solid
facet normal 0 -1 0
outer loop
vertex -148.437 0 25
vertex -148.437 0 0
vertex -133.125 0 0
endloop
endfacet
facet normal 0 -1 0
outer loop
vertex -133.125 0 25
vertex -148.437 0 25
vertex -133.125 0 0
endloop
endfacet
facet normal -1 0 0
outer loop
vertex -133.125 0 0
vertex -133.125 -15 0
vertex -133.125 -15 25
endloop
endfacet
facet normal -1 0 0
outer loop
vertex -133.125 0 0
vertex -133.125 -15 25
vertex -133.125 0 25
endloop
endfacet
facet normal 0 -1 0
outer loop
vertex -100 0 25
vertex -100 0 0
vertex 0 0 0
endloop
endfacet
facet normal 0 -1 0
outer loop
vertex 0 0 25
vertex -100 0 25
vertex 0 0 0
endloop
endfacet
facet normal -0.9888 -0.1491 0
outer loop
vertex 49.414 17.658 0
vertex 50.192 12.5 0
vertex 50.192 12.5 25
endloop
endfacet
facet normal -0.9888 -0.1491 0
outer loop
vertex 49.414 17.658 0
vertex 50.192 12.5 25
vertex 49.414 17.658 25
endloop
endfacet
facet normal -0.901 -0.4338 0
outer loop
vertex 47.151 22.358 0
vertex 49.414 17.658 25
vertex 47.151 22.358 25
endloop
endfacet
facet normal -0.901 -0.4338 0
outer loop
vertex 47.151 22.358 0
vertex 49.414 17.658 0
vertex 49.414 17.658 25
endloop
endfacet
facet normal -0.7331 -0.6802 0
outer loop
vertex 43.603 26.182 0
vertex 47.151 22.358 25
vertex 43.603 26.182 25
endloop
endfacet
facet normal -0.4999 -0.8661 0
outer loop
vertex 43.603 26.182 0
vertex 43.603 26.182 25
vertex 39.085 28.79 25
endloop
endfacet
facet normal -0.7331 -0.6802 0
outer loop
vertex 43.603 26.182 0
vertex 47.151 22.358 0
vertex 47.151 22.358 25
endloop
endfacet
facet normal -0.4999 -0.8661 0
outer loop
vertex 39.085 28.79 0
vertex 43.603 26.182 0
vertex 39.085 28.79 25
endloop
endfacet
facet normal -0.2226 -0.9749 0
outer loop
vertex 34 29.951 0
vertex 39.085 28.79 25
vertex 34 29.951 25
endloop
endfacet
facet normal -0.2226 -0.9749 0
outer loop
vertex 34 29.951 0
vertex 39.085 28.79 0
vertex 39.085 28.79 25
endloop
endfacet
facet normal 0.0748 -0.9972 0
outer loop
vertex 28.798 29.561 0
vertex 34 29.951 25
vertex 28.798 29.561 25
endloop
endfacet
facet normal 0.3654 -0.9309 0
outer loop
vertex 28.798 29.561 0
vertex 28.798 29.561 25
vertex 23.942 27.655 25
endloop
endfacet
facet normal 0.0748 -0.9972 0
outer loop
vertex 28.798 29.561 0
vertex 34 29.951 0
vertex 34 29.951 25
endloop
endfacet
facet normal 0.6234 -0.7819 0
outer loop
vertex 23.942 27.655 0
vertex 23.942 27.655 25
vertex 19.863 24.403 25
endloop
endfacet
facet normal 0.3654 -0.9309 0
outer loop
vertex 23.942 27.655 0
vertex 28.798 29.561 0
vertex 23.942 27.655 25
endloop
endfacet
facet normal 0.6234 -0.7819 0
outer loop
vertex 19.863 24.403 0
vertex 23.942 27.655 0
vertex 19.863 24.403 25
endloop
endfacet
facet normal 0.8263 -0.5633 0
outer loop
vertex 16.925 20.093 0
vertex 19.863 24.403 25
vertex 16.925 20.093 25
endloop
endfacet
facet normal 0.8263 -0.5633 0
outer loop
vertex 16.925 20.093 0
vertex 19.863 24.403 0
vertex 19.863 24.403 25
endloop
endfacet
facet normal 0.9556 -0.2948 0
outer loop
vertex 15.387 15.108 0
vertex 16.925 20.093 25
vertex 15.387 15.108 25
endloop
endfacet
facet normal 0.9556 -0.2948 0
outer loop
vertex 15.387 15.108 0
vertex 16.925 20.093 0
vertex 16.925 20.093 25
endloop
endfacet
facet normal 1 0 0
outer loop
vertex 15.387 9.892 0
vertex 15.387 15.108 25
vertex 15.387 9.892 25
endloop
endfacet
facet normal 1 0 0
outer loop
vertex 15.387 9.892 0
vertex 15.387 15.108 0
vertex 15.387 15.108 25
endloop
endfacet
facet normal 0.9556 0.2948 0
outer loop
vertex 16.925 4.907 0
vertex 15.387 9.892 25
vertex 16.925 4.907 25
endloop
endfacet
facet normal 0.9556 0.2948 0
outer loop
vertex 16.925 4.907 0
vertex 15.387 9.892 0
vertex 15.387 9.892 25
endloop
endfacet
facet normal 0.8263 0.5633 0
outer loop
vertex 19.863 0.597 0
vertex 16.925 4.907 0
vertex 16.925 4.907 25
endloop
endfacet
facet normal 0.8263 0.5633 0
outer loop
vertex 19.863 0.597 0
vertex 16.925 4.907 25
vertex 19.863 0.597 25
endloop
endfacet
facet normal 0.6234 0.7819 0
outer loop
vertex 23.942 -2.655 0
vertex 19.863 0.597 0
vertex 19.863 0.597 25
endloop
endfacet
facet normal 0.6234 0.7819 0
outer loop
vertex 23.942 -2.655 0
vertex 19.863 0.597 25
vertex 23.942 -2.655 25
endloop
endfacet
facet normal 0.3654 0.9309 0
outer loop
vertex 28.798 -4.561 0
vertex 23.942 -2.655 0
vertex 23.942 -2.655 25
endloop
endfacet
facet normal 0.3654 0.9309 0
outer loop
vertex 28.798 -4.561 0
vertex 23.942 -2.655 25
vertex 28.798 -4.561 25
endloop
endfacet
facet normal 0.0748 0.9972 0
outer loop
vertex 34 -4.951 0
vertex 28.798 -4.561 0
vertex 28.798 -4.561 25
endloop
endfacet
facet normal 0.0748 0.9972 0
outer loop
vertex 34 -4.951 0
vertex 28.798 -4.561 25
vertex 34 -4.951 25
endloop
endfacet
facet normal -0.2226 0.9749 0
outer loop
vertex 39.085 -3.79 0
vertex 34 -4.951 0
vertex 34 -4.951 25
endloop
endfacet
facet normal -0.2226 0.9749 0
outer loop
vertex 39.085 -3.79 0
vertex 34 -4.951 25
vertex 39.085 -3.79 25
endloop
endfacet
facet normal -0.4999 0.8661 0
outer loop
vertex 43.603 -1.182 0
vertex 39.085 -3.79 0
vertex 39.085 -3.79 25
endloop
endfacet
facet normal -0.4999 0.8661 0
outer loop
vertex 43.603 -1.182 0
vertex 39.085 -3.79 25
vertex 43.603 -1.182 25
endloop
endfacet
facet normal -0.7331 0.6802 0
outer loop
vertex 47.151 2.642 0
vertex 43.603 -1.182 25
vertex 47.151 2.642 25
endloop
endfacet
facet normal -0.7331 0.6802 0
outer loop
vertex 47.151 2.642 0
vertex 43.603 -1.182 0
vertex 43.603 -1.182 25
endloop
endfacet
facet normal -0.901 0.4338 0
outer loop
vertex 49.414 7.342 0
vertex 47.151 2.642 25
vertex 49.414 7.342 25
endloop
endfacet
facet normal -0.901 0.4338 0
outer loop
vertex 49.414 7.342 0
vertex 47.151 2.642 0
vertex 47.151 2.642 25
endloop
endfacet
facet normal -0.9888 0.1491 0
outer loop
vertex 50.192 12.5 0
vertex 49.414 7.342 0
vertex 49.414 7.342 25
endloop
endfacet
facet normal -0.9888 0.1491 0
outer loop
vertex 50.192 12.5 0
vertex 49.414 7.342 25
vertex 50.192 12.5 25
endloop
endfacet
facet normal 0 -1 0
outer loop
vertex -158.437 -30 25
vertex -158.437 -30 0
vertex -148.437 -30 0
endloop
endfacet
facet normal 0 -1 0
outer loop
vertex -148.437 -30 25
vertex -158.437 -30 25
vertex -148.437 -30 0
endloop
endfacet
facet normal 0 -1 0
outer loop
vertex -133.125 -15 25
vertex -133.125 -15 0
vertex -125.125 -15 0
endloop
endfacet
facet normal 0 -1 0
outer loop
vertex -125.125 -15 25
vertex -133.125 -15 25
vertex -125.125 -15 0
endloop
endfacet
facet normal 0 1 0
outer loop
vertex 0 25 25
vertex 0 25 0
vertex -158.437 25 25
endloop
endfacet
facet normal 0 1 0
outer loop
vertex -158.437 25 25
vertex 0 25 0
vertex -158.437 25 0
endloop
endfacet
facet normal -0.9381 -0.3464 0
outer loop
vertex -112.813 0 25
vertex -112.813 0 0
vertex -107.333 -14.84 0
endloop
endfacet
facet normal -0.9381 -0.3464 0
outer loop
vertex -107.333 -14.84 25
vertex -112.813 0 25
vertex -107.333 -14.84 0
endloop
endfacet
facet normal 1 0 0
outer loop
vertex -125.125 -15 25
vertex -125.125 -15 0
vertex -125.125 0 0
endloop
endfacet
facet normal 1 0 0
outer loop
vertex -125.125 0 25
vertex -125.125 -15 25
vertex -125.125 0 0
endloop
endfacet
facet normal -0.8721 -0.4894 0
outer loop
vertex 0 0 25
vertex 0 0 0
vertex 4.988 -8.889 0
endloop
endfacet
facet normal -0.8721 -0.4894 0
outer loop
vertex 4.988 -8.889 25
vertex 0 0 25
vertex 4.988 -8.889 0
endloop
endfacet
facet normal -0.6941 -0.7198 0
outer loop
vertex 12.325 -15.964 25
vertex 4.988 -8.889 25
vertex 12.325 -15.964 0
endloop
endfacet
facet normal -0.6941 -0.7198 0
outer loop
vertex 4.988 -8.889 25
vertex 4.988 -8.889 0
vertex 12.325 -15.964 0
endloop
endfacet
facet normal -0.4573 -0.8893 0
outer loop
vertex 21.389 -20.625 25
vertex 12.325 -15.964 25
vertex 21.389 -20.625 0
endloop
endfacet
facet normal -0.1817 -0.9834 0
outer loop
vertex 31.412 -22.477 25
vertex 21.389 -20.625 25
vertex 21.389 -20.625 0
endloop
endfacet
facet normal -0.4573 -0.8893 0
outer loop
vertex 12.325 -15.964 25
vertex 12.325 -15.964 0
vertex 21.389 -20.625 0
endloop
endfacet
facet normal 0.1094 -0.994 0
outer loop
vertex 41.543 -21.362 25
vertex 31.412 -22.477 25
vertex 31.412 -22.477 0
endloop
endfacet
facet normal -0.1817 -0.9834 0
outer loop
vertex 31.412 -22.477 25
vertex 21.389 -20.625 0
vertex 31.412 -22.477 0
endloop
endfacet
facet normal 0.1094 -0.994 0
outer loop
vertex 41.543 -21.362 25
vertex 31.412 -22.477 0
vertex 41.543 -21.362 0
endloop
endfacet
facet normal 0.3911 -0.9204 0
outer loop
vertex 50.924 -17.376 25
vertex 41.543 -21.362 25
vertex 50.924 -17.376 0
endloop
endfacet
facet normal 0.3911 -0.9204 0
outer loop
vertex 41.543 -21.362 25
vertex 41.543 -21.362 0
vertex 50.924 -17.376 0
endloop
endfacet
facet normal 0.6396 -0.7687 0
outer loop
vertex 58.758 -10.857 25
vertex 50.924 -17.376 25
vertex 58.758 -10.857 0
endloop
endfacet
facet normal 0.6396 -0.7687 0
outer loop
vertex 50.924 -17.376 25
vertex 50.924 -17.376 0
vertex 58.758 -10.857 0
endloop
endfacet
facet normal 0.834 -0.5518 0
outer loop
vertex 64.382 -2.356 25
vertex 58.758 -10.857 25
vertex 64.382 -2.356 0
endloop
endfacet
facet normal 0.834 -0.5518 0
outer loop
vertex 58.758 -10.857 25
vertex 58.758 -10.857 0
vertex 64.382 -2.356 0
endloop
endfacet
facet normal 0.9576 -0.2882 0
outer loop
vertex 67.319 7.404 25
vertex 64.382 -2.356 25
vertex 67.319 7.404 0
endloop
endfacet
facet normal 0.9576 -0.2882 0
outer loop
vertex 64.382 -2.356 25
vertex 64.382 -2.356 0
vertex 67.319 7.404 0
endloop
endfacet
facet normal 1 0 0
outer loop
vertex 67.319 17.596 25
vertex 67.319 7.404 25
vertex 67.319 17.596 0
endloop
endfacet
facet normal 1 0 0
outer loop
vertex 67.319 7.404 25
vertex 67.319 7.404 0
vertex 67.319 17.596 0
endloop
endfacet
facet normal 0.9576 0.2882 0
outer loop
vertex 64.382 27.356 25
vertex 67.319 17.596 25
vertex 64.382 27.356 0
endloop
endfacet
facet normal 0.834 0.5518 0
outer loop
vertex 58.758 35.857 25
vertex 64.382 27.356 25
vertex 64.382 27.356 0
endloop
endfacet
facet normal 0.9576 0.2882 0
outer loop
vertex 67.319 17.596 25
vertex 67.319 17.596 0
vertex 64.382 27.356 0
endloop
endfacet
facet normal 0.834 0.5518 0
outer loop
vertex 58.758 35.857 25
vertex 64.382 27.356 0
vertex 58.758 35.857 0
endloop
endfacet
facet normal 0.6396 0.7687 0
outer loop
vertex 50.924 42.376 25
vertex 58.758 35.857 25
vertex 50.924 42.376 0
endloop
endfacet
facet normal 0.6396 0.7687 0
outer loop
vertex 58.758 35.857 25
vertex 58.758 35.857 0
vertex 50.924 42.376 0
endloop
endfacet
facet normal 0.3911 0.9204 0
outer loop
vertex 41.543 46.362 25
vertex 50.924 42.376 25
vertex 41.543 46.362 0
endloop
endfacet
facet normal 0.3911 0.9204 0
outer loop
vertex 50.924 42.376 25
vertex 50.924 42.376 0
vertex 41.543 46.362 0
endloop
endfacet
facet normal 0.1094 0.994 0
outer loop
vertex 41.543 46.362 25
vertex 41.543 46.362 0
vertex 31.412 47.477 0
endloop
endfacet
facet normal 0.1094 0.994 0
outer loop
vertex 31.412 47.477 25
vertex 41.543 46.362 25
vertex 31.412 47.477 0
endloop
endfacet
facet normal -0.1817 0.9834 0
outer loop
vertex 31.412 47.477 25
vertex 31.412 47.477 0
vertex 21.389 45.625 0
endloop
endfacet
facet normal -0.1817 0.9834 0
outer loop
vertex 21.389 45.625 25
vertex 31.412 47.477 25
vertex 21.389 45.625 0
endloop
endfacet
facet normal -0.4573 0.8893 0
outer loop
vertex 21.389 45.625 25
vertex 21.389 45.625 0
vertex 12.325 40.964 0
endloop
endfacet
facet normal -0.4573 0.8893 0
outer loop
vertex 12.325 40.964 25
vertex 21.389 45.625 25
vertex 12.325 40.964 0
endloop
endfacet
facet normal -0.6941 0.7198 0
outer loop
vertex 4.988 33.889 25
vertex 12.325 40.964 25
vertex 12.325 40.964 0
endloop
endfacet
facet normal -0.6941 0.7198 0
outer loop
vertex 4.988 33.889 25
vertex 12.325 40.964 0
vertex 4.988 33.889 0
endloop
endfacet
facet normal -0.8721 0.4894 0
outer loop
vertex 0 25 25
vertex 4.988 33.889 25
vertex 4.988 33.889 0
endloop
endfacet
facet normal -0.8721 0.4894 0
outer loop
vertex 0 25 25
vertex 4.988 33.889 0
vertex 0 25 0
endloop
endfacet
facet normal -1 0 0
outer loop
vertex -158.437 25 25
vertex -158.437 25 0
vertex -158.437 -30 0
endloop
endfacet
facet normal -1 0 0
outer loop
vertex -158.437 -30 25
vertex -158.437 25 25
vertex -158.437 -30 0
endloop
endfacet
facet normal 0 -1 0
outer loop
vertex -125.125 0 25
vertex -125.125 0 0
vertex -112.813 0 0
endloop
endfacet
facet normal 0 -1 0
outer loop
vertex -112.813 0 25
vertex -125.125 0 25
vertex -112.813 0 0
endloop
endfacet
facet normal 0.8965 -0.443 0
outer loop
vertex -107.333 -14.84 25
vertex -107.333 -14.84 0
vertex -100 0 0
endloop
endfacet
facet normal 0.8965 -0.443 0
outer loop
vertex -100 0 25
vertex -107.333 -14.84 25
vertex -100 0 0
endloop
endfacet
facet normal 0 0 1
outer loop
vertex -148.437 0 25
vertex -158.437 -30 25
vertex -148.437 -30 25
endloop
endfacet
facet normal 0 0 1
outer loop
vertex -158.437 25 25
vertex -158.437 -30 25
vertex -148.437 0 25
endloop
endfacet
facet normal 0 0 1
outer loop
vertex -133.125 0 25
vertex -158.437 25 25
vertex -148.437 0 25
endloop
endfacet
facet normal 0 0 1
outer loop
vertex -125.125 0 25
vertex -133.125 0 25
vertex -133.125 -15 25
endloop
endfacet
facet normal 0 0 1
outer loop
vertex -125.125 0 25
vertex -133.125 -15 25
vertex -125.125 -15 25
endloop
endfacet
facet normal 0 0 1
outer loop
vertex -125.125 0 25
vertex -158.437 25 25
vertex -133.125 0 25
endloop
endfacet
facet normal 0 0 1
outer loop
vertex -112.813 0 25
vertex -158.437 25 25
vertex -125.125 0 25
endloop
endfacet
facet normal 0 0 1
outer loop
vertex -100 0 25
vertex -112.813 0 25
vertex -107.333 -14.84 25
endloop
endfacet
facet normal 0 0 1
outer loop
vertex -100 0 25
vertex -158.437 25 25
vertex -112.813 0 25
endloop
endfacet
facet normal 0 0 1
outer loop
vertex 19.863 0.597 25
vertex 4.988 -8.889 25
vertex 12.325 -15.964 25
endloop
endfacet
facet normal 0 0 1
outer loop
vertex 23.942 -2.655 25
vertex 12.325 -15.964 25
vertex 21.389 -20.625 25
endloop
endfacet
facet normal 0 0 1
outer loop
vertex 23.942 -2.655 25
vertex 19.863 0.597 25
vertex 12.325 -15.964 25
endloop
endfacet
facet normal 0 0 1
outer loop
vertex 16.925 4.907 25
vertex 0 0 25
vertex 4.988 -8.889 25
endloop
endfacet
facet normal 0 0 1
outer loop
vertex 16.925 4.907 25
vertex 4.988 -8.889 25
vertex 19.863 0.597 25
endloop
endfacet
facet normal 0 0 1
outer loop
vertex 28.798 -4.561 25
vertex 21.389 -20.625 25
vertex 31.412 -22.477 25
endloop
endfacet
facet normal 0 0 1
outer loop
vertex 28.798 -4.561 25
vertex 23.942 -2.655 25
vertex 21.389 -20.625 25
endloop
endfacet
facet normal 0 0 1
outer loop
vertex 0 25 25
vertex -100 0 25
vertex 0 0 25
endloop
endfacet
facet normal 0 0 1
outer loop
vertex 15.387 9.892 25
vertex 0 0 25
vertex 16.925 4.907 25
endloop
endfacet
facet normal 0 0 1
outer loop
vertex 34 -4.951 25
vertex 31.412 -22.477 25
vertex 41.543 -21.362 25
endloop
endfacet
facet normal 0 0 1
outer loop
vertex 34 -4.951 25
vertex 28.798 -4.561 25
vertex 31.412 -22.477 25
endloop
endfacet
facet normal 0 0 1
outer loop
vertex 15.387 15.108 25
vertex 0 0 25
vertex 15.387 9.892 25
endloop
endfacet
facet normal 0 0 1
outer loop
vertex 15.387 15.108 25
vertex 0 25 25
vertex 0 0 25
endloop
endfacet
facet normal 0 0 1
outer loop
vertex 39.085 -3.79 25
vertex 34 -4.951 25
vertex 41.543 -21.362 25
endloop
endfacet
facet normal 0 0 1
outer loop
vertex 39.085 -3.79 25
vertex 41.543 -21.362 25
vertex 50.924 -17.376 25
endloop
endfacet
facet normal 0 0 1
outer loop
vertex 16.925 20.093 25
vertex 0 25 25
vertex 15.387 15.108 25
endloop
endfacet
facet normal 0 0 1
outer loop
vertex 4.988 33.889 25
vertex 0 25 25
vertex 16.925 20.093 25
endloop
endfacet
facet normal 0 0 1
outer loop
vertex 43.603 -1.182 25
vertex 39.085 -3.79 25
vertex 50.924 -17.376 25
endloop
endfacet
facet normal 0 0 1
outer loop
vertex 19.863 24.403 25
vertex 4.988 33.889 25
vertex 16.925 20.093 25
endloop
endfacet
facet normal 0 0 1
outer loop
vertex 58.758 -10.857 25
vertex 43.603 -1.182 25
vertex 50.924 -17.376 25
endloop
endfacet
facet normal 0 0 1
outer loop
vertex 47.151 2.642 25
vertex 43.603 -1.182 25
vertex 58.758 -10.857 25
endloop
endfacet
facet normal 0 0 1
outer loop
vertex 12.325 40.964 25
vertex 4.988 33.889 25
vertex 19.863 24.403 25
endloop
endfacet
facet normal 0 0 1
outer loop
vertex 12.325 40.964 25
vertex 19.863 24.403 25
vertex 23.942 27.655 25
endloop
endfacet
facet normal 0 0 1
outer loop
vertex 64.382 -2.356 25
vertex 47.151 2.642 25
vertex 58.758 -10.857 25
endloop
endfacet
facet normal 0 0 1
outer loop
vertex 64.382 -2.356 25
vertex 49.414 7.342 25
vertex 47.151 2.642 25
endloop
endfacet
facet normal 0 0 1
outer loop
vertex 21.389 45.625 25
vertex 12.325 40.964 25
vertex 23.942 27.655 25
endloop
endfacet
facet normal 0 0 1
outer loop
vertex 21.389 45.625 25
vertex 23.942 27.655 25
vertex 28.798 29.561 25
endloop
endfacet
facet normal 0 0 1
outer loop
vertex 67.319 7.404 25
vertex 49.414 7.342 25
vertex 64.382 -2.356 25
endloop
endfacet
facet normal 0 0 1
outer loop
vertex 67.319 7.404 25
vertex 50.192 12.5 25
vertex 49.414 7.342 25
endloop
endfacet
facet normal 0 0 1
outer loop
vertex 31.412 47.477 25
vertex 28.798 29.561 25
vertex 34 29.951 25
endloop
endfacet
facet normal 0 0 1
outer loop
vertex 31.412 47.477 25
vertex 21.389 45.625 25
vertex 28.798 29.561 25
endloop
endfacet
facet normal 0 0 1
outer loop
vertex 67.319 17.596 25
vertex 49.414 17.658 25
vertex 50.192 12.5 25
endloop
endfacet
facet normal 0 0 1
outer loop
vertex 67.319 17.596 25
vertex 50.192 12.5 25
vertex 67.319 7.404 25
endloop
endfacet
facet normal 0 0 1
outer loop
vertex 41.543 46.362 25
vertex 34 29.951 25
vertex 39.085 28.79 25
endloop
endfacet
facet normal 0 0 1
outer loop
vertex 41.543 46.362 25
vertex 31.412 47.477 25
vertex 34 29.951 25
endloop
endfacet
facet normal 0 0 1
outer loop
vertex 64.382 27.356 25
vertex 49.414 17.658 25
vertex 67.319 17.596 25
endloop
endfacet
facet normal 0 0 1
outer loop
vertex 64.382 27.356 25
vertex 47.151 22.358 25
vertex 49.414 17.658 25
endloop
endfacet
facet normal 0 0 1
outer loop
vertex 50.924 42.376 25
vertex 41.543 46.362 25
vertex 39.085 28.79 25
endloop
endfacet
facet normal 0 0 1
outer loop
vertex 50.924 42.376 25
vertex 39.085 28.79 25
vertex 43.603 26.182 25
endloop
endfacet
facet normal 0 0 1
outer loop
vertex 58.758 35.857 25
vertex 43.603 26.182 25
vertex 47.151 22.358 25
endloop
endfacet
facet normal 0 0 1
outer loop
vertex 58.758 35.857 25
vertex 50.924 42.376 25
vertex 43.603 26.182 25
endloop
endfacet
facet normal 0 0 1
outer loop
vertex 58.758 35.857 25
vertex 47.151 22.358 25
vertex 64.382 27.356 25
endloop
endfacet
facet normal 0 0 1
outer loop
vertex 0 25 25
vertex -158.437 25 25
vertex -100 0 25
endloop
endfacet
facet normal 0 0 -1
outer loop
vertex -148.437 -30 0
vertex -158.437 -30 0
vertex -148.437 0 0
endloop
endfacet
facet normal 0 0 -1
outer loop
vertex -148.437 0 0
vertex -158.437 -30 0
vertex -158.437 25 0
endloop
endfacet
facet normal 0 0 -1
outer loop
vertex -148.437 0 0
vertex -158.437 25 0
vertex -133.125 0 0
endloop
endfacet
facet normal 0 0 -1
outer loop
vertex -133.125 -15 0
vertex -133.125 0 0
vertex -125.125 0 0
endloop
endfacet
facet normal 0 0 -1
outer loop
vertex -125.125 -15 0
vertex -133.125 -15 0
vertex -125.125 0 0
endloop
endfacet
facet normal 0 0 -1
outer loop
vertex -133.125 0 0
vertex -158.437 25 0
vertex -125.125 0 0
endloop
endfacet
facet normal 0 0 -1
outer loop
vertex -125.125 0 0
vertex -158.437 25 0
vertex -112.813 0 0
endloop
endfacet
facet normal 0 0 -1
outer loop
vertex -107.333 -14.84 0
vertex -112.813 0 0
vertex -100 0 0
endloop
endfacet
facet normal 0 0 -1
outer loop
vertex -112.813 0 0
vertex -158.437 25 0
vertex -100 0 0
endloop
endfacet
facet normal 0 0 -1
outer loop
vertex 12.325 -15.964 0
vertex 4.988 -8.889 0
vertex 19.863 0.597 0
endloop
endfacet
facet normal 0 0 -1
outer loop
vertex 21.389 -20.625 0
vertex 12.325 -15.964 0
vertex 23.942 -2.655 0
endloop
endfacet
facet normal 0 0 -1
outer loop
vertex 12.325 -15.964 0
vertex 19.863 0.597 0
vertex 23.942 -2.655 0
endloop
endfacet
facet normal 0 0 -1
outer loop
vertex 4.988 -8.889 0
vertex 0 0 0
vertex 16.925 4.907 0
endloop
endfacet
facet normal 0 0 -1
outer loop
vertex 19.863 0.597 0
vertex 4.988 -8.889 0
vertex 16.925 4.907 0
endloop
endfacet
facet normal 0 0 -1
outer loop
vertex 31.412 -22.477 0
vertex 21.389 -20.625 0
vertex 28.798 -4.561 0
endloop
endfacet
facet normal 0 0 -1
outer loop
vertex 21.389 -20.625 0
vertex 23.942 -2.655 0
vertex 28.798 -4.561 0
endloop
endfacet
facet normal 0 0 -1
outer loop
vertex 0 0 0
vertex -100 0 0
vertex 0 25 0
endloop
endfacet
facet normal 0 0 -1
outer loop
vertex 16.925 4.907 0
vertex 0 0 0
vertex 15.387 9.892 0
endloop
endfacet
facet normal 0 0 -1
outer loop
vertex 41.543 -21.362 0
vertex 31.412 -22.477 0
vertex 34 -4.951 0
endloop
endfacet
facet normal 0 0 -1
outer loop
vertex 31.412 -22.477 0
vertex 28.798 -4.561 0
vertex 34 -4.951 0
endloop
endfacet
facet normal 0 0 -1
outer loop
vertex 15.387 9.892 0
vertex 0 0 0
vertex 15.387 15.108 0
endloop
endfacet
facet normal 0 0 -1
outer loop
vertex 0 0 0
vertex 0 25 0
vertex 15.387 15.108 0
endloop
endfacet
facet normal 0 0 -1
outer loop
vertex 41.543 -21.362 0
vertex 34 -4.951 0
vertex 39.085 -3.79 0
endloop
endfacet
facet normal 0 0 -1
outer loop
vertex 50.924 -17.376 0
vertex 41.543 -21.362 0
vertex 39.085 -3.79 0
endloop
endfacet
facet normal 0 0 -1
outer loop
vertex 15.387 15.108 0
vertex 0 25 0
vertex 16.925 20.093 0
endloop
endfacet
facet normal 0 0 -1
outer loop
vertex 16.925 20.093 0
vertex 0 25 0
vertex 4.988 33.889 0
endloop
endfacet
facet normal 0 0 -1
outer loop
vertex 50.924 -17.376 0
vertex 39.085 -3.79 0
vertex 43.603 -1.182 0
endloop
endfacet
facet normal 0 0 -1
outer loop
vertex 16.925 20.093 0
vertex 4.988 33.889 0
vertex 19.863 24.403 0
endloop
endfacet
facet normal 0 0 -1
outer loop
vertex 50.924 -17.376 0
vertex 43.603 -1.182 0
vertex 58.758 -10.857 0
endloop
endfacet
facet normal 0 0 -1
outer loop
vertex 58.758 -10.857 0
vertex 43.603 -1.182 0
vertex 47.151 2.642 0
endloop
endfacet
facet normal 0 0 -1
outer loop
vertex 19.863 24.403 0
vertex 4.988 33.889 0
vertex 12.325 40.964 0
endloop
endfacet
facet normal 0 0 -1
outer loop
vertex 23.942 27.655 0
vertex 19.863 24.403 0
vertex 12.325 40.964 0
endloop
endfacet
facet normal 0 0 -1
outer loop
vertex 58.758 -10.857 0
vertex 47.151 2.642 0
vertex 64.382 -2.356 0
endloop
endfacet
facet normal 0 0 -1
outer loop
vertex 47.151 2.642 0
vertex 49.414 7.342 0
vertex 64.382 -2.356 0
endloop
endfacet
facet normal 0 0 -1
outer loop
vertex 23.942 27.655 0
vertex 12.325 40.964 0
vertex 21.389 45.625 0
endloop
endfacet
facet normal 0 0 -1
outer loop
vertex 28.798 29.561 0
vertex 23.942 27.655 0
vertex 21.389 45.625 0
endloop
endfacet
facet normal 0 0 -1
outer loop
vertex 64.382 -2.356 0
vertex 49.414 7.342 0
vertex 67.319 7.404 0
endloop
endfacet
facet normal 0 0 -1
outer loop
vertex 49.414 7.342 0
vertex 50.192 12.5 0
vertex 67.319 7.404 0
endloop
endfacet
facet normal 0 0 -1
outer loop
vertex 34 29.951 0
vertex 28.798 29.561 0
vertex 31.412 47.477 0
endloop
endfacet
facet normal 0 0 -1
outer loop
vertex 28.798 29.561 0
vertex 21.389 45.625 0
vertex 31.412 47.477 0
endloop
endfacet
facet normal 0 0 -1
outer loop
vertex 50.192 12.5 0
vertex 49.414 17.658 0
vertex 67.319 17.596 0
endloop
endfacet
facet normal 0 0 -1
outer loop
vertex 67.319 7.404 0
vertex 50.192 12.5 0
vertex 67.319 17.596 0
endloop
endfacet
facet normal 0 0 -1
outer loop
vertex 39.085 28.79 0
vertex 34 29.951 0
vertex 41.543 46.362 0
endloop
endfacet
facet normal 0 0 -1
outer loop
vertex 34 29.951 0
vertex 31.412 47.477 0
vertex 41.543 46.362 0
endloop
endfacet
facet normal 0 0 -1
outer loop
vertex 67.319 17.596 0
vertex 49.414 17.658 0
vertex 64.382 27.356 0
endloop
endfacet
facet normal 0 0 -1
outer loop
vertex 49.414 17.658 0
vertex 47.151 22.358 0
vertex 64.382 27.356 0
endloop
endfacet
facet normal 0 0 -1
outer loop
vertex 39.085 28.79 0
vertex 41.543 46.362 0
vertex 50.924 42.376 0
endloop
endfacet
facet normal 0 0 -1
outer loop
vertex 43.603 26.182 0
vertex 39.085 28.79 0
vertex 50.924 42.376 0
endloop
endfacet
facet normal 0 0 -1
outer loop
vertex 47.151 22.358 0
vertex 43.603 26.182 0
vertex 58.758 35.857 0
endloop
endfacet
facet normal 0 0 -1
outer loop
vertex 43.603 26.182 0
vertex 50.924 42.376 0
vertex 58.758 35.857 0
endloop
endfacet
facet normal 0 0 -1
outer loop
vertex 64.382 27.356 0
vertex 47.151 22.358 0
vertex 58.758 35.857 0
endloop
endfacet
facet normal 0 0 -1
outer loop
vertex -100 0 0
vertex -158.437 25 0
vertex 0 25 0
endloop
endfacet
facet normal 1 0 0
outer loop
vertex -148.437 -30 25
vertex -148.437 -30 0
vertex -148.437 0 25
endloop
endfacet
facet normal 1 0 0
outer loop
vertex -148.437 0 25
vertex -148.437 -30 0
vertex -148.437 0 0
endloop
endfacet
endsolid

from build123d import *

# Parameters (mm, degrees)
F0_R     = 17.5
F0_W     = 8
F0_H     = 15
F0_W_2   = 10
F0_H_2   = 30
F1_DEPTH = 25


with BuildPart() as f1:
    # F0 (on Top) → F1 (new body)
    with BuildSketch(Plane.XY):
        Polygon((-100.000008, 0), (0, 0), (0, 25), (-158.437499, 25), (-158.437499, 0), (-148.437499, 0), (-133.125003, 0), (-125.125003, 0), (-112.812507, 0), align=None)
        with BuildLine():
            Line((0, 25), (0, 0))
            ThreePointArc((0, 0), (67.691742, 12.5), (0, 25))
        make_face()
        with Locations((32.691742, 12.5)):
            Circle(F0_R, mode=Mode.SUBTRACT)
        Polygon((-107.33281, -14.84021), (-100.000008, 0), (-112.812507, 0), align=None)
        with Locations((-129.125003, -7.5)):
            Rectangle(F0_W, F0_H)
        with Locations((-153.437499, -15)):
            Rectangle(F0_W_2, F0_H_2)
    extrude(amount=F1_DEPTH)


solid = f1.part
